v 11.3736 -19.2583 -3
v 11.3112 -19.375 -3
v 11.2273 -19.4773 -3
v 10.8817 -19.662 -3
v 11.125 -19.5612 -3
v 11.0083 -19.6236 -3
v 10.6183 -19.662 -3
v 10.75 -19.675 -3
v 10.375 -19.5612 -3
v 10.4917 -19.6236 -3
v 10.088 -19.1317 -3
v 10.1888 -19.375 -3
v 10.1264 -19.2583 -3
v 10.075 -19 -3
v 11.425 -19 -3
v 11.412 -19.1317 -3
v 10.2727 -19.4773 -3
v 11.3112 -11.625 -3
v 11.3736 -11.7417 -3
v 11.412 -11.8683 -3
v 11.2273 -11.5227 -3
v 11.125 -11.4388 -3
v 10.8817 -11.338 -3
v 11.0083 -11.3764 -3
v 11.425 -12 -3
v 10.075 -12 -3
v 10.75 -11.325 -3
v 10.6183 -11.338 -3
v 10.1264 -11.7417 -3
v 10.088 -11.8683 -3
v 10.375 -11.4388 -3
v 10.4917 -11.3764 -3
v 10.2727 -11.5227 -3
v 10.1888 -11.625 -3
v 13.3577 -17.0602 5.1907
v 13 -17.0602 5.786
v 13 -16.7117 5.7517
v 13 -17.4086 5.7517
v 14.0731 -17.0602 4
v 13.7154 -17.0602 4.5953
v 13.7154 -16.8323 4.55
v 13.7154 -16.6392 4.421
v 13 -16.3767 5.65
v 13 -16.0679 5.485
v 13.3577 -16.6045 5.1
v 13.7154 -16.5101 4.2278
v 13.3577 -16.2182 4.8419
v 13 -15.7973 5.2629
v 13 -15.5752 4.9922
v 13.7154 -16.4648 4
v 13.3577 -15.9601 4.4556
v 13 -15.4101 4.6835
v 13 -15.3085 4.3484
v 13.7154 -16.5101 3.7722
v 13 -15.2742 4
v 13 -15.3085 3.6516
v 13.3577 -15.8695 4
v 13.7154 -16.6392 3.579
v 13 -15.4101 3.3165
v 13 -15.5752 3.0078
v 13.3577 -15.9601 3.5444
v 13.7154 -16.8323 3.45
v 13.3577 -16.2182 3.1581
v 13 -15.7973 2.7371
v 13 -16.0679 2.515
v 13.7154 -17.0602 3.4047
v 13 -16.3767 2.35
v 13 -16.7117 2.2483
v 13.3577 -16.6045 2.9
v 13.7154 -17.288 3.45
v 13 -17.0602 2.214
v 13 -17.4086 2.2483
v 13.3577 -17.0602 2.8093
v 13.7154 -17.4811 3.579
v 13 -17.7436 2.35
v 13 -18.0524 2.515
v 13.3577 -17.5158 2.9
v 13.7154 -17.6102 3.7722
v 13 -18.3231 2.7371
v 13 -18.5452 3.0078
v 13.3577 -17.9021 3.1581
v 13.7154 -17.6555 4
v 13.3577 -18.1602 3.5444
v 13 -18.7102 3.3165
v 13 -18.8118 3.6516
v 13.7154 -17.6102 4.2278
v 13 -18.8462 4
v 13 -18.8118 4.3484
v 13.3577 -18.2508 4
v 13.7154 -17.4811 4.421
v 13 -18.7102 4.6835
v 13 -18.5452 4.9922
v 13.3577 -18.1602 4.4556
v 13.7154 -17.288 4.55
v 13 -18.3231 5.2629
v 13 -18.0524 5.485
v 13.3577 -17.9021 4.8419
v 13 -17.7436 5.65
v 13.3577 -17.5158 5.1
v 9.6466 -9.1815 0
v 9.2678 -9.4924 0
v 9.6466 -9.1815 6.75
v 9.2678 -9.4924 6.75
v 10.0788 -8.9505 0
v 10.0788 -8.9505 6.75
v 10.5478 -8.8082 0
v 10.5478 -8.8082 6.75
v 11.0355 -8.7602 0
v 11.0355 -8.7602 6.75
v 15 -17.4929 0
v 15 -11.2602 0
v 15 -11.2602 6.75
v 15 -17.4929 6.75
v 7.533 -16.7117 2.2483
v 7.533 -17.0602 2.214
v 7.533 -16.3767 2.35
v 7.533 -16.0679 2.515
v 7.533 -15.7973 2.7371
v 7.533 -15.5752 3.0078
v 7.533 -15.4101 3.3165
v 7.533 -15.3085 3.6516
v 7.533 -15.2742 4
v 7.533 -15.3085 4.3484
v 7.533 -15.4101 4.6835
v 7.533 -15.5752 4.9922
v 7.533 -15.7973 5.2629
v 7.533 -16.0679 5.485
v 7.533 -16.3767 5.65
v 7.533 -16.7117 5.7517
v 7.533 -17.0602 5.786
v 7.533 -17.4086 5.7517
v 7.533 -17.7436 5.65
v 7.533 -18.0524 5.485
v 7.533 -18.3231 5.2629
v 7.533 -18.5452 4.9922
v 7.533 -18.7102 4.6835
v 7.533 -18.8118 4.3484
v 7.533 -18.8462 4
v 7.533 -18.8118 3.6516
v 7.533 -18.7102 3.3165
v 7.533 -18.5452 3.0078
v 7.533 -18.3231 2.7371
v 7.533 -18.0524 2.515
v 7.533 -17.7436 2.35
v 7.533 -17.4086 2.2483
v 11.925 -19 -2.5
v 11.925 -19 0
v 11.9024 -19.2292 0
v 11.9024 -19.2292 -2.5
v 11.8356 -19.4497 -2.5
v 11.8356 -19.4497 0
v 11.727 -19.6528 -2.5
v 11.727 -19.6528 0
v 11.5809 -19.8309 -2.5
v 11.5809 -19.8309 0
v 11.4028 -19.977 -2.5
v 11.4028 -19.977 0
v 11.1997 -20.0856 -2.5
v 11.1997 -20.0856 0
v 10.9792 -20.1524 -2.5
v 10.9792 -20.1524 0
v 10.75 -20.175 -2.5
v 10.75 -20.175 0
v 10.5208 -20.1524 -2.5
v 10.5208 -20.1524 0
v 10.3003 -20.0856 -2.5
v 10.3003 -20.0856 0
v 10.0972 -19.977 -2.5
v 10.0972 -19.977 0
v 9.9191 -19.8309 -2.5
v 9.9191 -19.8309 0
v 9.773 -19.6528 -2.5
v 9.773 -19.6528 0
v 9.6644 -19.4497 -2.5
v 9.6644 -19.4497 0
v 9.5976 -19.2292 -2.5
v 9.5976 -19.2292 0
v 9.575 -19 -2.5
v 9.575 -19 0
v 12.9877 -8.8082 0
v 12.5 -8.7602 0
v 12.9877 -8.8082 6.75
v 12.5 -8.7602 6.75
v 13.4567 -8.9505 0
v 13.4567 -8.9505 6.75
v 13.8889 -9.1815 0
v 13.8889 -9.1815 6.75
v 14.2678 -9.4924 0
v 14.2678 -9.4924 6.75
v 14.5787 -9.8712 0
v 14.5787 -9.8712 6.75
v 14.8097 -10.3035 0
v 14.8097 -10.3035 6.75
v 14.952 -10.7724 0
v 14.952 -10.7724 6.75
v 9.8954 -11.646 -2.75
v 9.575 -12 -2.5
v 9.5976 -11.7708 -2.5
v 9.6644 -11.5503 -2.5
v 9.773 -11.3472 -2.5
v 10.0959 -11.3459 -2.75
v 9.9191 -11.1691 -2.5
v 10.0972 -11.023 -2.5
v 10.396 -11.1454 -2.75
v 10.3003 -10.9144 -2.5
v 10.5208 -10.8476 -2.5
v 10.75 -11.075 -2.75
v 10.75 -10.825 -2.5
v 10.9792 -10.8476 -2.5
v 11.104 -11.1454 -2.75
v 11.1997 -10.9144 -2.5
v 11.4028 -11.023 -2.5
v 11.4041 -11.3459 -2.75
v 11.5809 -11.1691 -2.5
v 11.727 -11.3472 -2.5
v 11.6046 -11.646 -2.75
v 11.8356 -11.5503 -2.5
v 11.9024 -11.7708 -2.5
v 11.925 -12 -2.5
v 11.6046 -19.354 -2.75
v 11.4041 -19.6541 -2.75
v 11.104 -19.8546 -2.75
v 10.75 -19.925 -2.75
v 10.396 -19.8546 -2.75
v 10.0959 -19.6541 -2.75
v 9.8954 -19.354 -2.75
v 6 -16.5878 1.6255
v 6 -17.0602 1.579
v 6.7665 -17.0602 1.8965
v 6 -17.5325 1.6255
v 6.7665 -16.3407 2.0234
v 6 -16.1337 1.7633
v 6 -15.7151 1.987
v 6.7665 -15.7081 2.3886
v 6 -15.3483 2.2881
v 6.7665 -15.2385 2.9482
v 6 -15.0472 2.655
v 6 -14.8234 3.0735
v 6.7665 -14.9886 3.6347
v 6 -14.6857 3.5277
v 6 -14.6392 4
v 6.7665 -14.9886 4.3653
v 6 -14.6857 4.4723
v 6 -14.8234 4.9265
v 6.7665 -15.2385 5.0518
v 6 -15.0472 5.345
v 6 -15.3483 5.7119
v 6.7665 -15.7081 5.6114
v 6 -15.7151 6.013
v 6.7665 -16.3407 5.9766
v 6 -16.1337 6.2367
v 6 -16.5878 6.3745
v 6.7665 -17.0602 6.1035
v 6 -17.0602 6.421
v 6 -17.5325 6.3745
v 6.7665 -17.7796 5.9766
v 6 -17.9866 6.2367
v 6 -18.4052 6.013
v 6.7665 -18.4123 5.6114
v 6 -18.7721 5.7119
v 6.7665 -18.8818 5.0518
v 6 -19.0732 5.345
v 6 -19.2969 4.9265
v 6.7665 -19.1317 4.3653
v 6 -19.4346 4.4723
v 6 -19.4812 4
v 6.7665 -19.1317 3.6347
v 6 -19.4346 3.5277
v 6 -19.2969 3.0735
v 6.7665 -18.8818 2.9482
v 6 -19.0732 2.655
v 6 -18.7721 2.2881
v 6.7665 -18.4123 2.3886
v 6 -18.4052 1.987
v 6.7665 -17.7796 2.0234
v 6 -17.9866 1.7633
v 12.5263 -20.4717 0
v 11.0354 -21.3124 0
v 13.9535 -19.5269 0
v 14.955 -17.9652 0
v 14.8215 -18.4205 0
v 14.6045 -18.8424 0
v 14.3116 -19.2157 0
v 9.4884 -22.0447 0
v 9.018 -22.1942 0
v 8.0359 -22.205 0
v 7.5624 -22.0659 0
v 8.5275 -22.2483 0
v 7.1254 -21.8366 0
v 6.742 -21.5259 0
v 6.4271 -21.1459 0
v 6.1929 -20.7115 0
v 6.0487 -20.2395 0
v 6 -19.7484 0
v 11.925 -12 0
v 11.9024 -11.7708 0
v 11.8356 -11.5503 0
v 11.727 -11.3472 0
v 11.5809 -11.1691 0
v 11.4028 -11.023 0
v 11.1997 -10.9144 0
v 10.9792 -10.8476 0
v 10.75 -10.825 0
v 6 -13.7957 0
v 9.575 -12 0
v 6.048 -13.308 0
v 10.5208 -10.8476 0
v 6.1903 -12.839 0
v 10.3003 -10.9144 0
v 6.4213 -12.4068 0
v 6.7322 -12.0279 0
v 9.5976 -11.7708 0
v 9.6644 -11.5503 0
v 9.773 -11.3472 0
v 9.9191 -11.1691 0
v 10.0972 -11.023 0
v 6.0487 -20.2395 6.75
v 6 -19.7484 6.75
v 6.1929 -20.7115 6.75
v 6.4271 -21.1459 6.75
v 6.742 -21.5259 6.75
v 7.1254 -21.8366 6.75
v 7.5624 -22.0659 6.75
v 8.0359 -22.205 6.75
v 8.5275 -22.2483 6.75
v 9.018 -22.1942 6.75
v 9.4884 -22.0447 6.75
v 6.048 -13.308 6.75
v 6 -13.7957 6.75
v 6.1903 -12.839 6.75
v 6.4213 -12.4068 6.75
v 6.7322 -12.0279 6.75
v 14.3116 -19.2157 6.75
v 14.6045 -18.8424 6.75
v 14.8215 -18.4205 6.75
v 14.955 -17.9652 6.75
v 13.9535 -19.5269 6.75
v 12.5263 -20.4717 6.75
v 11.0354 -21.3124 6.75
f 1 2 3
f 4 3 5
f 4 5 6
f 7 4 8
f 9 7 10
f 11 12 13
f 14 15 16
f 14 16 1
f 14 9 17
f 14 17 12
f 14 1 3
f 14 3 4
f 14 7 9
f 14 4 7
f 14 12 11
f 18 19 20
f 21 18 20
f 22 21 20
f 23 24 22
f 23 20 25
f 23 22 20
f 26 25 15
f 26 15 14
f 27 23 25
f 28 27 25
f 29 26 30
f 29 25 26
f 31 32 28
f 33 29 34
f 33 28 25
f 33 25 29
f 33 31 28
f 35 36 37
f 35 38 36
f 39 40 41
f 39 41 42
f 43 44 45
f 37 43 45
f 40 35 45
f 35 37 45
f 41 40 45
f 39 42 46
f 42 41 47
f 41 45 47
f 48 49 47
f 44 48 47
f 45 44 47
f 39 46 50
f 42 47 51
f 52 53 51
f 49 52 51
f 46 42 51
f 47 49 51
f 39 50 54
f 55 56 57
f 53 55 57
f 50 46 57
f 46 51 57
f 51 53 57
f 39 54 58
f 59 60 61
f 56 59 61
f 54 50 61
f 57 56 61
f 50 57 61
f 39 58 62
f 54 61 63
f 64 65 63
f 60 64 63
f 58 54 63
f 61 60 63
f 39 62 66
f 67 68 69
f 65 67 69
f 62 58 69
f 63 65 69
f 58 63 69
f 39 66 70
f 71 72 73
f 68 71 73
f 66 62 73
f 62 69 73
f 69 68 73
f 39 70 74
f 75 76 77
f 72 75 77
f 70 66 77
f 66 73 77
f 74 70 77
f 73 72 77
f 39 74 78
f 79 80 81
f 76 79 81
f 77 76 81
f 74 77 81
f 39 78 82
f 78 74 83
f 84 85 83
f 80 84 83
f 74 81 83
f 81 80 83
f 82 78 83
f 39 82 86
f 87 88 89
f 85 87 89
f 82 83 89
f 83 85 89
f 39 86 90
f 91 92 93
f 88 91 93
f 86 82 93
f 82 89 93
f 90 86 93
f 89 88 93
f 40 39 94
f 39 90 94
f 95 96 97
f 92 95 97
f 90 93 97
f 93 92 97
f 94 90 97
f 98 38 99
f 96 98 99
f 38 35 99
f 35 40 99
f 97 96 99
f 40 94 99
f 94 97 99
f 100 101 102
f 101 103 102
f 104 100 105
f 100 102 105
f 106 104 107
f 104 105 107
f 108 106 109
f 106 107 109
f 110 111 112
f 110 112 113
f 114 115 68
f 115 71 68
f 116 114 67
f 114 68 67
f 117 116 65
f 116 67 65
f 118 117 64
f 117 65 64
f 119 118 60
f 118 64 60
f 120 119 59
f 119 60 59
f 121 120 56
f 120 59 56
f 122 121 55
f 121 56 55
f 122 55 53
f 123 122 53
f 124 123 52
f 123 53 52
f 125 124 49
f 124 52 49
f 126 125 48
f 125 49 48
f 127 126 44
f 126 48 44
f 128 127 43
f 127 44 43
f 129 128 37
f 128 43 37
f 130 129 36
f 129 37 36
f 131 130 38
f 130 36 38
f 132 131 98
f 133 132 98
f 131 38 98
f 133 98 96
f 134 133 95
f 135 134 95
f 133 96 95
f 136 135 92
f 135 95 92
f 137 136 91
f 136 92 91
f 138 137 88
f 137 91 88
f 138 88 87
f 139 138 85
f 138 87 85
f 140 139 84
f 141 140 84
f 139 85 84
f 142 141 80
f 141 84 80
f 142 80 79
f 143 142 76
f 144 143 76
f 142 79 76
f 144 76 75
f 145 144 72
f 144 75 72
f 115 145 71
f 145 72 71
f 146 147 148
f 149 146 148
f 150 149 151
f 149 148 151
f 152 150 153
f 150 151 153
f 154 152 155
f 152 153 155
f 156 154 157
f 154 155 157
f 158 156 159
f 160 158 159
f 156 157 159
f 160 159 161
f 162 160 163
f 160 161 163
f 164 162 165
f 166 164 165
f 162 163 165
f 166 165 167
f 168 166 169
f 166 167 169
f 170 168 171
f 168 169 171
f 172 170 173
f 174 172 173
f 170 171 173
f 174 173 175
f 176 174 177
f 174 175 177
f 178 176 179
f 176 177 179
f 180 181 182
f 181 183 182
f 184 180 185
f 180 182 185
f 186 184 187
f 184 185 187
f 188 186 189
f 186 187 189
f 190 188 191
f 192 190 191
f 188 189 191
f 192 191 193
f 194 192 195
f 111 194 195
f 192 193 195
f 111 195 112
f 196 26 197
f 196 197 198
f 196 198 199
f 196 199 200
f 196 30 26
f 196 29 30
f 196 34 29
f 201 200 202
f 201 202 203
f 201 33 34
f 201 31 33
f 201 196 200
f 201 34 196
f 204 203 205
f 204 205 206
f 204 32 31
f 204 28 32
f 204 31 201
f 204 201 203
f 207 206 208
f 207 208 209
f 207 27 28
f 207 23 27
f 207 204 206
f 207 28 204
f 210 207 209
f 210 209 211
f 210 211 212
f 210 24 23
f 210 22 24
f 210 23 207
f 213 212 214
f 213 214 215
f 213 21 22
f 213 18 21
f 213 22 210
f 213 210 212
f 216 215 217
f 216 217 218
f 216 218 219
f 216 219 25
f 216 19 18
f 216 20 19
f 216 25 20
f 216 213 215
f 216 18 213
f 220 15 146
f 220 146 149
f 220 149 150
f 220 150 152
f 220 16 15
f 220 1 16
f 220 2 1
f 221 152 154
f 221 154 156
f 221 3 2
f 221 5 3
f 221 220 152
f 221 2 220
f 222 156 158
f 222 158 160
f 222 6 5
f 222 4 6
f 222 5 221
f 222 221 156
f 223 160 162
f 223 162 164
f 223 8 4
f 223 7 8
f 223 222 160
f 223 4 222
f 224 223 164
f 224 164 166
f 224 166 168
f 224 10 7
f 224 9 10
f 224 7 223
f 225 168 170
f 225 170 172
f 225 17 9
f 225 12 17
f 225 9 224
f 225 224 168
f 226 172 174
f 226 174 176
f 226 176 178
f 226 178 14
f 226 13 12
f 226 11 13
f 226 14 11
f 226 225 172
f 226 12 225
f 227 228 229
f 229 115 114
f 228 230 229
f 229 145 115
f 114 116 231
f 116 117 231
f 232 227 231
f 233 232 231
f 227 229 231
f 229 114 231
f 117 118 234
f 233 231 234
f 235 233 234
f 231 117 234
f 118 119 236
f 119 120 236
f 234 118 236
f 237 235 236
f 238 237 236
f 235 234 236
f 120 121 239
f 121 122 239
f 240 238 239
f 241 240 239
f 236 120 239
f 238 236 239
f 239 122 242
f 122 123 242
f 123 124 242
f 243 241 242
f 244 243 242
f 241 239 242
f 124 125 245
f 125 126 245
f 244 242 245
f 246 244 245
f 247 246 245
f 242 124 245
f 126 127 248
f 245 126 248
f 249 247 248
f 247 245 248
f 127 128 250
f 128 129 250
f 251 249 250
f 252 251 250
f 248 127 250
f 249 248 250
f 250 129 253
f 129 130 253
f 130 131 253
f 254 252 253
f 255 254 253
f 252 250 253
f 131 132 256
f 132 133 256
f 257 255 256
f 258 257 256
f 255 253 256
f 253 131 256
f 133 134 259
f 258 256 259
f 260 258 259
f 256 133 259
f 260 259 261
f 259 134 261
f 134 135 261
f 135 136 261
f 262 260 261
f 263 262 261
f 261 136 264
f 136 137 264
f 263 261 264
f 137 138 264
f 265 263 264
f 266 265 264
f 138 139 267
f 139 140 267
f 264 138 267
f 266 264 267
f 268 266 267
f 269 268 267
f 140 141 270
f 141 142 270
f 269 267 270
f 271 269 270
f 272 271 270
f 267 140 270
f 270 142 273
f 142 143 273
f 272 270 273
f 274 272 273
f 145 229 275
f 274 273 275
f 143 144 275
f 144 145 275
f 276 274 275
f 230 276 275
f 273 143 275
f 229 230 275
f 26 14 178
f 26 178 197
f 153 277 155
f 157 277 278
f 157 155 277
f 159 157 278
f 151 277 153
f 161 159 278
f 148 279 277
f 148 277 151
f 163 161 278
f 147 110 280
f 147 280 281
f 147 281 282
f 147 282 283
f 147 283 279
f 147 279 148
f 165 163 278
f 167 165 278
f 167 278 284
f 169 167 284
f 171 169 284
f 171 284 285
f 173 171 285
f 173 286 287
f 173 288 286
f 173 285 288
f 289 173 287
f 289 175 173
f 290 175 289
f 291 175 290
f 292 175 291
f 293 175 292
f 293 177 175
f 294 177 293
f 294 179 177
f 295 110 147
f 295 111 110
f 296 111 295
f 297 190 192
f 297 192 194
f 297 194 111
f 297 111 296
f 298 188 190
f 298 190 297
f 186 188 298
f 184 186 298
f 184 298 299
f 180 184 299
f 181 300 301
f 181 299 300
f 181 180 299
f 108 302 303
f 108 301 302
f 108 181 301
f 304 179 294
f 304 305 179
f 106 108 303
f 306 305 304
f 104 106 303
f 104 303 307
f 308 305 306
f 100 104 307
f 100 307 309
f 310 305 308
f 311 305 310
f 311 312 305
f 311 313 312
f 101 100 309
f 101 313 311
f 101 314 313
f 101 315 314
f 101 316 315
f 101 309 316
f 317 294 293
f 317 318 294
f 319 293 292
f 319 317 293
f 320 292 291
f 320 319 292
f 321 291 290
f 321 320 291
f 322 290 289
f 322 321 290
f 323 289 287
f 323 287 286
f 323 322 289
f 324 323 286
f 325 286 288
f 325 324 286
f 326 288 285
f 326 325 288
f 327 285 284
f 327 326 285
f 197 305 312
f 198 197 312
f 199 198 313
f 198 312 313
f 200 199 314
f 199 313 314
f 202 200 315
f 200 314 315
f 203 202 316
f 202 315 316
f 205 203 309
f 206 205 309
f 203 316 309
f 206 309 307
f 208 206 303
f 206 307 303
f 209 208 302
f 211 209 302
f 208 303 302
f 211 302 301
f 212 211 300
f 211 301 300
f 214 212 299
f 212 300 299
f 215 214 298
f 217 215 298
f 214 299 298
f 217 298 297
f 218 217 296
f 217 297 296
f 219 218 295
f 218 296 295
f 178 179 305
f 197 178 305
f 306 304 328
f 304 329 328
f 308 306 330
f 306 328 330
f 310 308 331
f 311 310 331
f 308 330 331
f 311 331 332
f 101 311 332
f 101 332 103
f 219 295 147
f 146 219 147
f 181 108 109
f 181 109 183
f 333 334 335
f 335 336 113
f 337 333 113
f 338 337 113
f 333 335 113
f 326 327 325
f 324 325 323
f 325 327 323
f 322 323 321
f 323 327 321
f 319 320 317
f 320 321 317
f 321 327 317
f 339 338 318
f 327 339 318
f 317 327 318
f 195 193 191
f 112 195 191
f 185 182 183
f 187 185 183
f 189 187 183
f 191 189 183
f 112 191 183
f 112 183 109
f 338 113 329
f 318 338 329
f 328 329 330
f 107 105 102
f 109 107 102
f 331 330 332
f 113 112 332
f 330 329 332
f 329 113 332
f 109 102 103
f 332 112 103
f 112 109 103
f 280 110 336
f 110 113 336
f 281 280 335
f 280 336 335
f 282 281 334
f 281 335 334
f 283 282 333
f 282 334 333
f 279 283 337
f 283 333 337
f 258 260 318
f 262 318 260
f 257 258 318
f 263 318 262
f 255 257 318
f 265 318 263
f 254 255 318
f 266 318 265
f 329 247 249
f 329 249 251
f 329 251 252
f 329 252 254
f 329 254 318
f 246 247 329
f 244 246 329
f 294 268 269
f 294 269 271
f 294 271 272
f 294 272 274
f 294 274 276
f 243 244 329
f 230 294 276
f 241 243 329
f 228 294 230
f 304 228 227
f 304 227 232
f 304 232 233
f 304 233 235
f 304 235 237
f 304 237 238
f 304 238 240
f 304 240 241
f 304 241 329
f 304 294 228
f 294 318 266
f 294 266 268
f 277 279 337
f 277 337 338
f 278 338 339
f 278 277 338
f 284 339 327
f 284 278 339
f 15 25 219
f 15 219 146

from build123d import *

# Parameters (mm, degrees)
BODY_DEPTH                                = 6.75
FILLET1_R                                 = 2.5
F_9_64_0_14063_DIAMETER_HOLE1_D           = 3.572002
F_9_64_0_14063_DIAMETER_HOLE1_DEPTH       = 7
F_9_64_0_14063_DIAMETER_HOLE1_CSINK_D     = 4.842002
F_9_64_0_14063_DIAMETER_HOLE1_CSINK_ANGLE = 45
F_9_64_0_14063_DIAMETER_HOLE1_TIP         = 1.073137666
MOUNT_PEG_DEPTH                           = 3
PEG_CHAMFER_SIZE                          = 0.5


with BuildPart() as part:
    # Sketch1 → body (new body)
    with BuildSketch(Plane.XY):
        with BuildLine():
            Line((6, -23.237900077), (6, -12.760161762))
            Line((6, -12.760161762), (10, -8.760161762))
            Line((10, -8.760161762), (15, -8.760161762))
            Line((15, -8.760161762), (15, -18.734993995))
            ThreePointArc((15, -18.734993995), (10.738670346, -21.463479662), (6, -23.237900077))
        make_face()
    extrude(amount=BODY_DEPTH)

    # Fillet1
    fillet1_edges = [part.edges().sort_by_distance(p)[0] for p in [
        (6, -23.237900077, 3.375),
        (6, -12.760161762, 3.375),
        (10, -8.760161762, 3.375),
        (15, -8.760161762, 3.375),
        (15, -18.734993995, 3.375),
    ]]
    fillet(fillet1_edges, radius=FILLET1_R)

    # 9/64 (0.14063) Diameter Hole1
    with Locations(Plane.ZY.offset(-6)):
        with Locations((4, -17.060161762)):
            CounterSinkHole(F_9_64_0_14063_DIAMETER_HOLE1_D / 2, F_9_64_0_14063_DIAMETER_HOLE1_CSINK_D / 2, depth=F_9_64_0_14063_DIAMETER_HOLE1_DEPTH, counter_sink_angle=F_9_64_0_14063_DIAMETER_HOLE1_CSINK_ANGLE)
            with Locations((0, 0, -(F_9_64_0_14063_DIAMETER_HOLE1_DEPTH + F_9_64_0_14063_DIAMETER_HOLE1_TIP / 2))):  # 118° drill point
                Cone(0, F_9_64_0_14063_DIAMETER_HOLE1_D / 2, F_9_64_0_14063_DIAMETER_HOLE1_TIP, mode=Mode.SUBTRACT)

    # Sketch4 → mount peg (add)
    with BuildSketch(Plane(origin=(0, 0, 0), x_dir=(-1, 0, 0), z_dir=(0, 0, -1))):
        with BuildLine():
            Line((-9.575, -19), (-9.575, -12))
            ThreePointArc((-9.575, -12), (-10.75, -10.825), (-11.925, -12))
            Line((-11.925, -12), (-11.925, -19))
            ThreePointArc((-11.925, -19), (-10.75, -20.175), (-9.575, -19))
        make_face()
    extrude(amount=MOUNT_PEG_DEPTH)

    # peg chamfer
    peg_chamfer_edges = [part.edges().sort_by_distance(p)[0] for p in [
        (11.925, -15.5, -3),
        (10.75, -10.825, -3),
        (9.575, -15.5, -3),
        (10.75, -20.175, -3),
    ]]
    chamfer(peg_chamfer_edges, length=PEG_CHAMFER_SIZE)


solid = part.part
